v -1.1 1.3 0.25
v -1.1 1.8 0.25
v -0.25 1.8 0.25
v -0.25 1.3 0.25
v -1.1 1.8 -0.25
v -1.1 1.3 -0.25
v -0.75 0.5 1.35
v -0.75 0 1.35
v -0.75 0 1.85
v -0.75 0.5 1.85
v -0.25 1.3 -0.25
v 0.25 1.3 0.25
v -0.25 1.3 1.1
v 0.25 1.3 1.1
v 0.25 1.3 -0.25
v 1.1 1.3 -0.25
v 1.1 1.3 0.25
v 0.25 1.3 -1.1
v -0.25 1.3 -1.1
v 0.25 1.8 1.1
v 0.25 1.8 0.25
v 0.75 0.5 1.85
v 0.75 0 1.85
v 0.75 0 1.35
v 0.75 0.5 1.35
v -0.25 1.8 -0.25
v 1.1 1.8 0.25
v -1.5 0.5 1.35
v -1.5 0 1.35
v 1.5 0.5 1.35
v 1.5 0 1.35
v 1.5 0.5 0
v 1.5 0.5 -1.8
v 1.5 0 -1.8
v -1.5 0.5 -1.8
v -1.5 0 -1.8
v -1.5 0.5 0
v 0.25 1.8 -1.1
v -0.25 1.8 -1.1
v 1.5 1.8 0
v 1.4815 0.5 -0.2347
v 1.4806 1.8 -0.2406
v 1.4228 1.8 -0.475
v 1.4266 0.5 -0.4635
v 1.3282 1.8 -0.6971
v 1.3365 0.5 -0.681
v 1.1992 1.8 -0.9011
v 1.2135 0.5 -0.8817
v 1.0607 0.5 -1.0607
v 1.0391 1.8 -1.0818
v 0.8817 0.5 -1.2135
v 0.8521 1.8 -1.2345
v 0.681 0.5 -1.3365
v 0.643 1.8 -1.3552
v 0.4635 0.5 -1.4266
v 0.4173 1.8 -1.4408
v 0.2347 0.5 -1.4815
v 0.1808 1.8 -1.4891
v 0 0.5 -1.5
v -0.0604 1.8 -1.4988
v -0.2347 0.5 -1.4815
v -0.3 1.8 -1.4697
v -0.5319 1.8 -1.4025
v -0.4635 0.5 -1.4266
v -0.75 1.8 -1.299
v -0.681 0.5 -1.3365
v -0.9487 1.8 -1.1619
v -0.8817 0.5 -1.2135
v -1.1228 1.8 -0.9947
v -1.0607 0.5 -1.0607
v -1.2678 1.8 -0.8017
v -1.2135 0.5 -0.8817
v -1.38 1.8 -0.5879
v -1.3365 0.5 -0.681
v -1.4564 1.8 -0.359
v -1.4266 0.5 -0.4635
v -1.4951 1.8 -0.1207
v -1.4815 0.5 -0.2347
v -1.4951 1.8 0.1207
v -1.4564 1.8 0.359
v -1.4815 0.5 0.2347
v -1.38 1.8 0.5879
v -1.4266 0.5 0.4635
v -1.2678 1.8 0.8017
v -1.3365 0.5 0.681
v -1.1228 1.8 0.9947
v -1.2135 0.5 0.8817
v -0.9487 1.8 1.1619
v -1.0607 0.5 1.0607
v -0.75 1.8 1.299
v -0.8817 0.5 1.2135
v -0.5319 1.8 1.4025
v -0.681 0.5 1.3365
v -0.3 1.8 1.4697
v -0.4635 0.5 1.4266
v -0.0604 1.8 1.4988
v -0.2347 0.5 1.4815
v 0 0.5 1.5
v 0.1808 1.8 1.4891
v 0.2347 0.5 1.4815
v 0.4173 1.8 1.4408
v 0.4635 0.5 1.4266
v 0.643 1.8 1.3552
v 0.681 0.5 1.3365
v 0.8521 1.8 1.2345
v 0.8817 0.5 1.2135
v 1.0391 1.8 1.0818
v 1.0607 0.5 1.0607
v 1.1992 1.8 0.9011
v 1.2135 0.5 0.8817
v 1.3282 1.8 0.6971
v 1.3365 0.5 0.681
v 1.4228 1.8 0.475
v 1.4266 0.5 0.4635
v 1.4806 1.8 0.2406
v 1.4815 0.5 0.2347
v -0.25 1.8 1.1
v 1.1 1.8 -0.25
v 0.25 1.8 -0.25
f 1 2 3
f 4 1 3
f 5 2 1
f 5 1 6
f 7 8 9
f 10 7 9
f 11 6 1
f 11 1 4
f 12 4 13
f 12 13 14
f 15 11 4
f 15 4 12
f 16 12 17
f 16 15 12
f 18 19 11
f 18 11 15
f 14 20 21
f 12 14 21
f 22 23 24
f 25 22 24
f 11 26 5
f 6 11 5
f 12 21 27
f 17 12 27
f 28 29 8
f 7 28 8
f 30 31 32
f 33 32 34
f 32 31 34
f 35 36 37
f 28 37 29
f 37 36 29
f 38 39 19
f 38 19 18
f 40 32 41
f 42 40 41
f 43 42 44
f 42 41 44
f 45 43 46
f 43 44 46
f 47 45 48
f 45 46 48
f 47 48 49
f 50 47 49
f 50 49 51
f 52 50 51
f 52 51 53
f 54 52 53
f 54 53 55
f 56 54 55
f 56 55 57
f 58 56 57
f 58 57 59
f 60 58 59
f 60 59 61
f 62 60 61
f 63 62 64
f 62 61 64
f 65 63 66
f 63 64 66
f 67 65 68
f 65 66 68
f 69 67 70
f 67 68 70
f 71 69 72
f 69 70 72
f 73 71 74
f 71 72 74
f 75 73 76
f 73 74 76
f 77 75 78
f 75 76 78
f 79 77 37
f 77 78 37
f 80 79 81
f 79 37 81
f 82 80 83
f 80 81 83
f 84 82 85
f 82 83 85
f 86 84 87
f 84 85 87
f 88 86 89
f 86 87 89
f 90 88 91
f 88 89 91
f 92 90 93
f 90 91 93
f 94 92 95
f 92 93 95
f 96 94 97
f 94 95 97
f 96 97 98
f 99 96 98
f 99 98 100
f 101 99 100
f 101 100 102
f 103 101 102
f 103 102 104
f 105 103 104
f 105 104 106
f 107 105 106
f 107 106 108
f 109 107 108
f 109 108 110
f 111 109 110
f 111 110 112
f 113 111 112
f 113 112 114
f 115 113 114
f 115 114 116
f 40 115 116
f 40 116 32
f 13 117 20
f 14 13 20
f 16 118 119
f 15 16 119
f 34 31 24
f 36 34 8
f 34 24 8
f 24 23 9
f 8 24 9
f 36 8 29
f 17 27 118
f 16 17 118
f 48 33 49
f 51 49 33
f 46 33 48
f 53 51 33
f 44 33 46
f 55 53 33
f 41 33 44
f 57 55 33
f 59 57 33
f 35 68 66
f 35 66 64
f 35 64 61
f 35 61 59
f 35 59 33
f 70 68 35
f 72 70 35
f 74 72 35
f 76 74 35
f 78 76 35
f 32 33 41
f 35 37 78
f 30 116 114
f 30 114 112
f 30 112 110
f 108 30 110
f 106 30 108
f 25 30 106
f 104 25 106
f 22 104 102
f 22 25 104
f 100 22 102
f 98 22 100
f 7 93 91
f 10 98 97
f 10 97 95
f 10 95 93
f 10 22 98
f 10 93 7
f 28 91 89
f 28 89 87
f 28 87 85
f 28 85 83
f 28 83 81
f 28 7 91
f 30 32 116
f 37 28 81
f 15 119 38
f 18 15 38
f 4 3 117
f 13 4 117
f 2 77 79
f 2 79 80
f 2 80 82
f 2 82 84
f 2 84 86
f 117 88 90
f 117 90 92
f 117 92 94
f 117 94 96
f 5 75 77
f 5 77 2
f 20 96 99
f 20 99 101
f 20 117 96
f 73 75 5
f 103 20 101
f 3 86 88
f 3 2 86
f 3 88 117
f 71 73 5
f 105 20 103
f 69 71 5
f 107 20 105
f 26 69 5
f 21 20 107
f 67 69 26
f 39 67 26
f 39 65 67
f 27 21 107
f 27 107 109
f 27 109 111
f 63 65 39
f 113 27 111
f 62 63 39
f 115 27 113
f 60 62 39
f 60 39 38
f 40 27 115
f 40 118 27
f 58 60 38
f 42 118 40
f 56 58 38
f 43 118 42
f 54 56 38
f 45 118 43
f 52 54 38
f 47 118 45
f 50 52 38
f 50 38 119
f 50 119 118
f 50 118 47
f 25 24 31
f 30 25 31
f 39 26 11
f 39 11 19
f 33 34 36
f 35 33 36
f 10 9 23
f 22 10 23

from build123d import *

# Parameters (mm, degrees)
SKETCH1_R           = 1.5
BOSS_EXTRUDE1_DEPTH = 1.8
BOSS_EXTRUDE2_DEPTH = 0.5
SKETCH4_W           = 0.85
SKETCH4_H           = 0.5
SKETCH4_W_2         = 0.5
SKETCH4_H_2         = 0.85
CUT_EXTRUDE1_DEPTH  = 0.5


with BuildPart() as part:
    # Sketch1 → Boss-Extrude1 (new body)
    with BuildSketch(Plane(origin=(0, 0, 0), x_dir=(1, 0, 0), z_dir=(0, 1, 0))):
        Circle(SKETCH1_R)
    extrude(amount=BOSS_EXTRUDE1_DEPTH)

    # Sketch2 → Boss-Extrude2 (add)
    with BuildSketch(Plane.XZ):
        Polygon((1.5, 1.35), (1.5, -1.8), (-1.5, -1.8), (-1.5, 1.35), (-0.75, 1.35), (-0.75, 1.85), (0.75, 1.85), (0.75, 1.35), align=None)
    extrude(amount=-BOSS_EXTRUDE2_DEPTH)

    # Sketch4 → Cut-Extrude1 (cut)
    with BuildSketch(Plane(origin=(0, 1.8, 0), x_dir=(1, 0, 0), z_dir=(0, 1, 0))):
        with Locations((0.675, 0)):
            Rectangle(SKETCH4_W, SKETCH4_H)
        Rectangle(SKETCH4_W_2, SKETCH4_H)
        with Locations((0, -0.675)):
            Rectangle(SKETCH4_W_2, SKETCH4_H_2)
        with Locations((-0.675, 0)):
            Rectangle(SKETCH4_W, SKETCH4_H)
        with Locations((0, 0.675)):
            Rectangle(SKETCH4_W_2, SKETCH4_H_2)
    extrude(amount=-CUT_EXTRUDE1_DEPTH, mode=Mode.SUBTRACT)


solid = part.part
